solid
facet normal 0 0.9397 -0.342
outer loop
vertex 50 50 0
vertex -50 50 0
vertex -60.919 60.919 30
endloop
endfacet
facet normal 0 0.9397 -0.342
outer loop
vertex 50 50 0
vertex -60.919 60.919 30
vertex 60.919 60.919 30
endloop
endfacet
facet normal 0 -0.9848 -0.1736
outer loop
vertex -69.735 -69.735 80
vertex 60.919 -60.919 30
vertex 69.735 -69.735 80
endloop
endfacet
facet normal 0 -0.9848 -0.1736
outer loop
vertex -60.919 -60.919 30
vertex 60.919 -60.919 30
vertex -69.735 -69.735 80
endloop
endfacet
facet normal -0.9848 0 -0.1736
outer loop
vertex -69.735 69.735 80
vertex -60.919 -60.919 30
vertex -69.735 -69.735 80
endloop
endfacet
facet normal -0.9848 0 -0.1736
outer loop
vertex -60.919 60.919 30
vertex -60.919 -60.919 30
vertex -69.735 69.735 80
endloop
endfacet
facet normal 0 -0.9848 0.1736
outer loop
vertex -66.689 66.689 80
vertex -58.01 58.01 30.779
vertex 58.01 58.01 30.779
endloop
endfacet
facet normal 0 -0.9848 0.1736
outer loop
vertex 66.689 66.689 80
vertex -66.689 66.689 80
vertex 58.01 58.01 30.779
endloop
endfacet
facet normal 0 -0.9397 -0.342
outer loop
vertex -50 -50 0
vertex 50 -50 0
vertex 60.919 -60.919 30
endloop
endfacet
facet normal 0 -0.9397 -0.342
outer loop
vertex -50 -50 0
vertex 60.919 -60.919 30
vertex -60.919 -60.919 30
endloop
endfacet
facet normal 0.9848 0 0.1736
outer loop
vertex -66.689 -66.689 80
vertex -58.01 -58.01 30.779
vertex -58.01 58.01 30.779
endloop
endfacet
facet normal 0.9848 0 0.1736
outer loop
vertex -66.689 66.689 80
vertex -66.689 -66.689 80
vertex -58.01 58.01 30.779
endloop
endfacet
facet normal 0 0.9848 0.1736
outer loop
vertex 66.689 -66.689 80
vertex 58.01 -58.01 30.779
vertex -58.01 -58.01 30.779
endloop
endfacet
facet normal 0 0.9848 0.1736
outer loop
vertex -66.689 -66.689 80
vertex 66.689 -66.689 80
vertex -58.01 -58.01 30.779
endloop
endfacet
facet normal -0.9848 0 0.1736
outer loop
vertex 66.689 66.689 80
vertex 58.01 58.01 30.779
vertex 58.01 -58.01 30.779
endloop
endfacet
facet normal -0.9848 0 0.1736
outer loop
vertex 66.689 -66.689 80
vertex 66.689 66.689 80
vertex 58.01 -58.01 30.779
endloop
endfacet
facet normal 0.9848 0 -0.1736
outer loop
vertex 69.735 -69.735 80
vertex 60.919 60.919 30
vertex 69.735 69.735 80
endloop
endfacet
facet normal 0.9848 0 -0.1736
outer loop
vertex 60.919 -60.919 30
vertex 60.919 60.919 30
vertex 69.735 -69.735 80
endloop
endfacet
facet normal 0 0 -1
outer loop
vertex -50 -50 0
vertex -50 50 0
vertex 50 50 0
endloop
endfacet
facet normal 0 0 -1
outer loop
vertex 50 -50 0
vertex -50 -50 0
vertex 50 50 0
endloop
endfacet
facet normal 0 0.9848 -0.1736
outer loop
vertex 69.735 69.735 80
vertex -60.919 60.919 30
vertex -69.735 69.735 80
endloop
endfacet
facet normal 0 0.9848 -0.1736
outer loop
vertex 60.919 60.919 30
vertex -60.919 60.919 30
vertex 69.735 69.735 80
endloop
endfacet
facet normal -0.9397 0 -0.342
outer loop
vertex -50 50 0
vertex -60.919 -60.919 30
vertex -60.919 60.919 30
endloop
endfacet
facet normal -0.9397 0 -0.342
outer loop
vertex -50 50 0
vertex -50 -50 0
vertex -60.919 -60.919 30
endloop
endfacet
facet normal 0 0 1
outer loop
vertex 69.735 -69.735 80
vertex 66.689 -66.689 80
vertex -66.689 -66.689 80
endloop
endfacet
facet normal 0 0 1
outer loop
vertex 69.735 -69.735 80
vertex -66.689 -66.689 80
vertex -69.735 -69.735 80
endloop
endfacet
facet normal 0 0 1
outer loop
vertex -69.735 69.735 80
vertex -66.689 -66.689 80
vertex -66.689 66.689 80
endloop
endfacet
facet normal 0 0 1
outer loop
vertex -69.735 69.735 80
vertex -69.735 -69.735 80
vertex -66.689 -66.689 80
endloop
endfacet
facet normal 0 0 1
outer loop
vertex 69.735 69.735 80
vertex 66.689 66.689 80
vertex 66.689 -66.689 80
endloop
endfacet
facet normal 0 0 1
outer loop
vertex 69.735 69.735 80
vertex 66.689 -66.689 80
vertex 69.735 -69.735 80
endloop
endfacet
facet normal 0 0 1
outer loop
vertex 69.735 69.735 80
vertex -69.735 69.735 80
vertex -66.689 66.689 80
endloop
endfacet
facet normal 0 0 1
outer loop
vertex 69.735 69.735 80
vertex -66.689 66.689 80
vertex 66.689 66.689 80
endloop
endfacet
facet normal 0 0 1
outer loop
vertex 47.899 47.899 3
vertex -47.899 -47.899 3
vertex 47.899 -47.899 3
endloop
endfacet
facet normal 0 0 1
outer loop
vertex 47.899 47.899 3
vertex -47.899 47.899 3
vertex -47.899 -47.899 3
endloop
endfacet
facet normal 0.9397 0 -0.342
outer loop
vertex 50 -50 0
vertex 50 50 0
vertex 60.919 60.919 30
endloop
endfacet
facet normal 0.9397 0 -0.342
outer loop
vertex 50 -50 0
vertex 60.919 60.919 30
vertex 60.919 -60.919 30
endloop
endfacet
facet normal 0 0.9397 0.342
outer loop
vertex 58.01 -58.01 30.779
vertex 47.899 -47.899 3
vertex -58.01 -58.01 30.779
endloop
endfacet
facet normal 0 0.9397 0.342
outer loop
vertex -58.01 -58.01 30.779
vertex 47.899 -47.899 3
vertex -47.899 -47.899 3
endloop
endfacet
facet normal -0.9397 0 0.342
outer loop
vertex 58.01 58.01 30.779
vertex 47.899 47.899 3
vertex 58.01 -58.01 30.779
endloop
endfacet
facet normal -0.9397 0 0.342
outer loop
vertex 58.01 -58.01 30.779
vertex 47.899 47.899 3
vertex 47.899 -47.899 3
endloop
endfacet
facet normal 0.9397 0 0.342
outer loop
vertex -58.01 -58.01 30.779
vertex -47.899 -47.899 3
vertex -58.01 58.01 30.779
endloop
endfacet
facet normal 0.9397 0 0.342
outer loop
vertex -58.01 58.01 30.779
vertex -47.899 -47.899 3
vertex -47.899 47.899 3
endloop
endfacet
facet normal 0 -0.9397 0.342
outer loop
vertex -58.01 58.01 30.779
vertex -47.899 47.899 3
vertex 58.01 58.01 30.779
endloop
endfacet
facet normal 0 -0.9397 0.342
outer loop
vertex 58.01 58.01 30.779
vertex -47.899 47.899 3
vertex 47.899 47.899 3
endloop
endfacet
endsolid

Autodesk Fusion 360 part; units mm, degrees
sketch "스케치1" plane through (0, 0, 0) normal (0, 0, 1) x (1, 0, 0) in component "Component'"
  line L0 (-50, 50) -> (50, 50)
  line L1 (50, 50) -> (50, -50)
  line L2 (50, -50) -> (-50, -50)
  line L3 (-50, -50) -> (-50, 50)
  line L4 (-150, -30) -> (-65.8539, -30)
  line L5 (-65.8539, -30) -> (-94.1954, 36.1303)
  line L6 (-94.1954, 36.1303) -> (-70, 20)
  line L7 (-70, 20) -> (-80, 50)
extrude "돌출1" add sketch "스케치1" along normal blind 30 draft 20 in component "Component'"
extrude "돌출2" add 1 faces at (-20.3064, 20.3064, 30) along direction (0, 0, 1) blind 50 draft 10 in component "Component'"
shell "쉘1" thickness 3 removed faces 1 at (-23.2452, 23.2452, 80) in component "Component'"
component "Component'" placed x (1, 0, 0) y (0, 1, 0) z (0, 0, 1) at (0, 0, 0)
